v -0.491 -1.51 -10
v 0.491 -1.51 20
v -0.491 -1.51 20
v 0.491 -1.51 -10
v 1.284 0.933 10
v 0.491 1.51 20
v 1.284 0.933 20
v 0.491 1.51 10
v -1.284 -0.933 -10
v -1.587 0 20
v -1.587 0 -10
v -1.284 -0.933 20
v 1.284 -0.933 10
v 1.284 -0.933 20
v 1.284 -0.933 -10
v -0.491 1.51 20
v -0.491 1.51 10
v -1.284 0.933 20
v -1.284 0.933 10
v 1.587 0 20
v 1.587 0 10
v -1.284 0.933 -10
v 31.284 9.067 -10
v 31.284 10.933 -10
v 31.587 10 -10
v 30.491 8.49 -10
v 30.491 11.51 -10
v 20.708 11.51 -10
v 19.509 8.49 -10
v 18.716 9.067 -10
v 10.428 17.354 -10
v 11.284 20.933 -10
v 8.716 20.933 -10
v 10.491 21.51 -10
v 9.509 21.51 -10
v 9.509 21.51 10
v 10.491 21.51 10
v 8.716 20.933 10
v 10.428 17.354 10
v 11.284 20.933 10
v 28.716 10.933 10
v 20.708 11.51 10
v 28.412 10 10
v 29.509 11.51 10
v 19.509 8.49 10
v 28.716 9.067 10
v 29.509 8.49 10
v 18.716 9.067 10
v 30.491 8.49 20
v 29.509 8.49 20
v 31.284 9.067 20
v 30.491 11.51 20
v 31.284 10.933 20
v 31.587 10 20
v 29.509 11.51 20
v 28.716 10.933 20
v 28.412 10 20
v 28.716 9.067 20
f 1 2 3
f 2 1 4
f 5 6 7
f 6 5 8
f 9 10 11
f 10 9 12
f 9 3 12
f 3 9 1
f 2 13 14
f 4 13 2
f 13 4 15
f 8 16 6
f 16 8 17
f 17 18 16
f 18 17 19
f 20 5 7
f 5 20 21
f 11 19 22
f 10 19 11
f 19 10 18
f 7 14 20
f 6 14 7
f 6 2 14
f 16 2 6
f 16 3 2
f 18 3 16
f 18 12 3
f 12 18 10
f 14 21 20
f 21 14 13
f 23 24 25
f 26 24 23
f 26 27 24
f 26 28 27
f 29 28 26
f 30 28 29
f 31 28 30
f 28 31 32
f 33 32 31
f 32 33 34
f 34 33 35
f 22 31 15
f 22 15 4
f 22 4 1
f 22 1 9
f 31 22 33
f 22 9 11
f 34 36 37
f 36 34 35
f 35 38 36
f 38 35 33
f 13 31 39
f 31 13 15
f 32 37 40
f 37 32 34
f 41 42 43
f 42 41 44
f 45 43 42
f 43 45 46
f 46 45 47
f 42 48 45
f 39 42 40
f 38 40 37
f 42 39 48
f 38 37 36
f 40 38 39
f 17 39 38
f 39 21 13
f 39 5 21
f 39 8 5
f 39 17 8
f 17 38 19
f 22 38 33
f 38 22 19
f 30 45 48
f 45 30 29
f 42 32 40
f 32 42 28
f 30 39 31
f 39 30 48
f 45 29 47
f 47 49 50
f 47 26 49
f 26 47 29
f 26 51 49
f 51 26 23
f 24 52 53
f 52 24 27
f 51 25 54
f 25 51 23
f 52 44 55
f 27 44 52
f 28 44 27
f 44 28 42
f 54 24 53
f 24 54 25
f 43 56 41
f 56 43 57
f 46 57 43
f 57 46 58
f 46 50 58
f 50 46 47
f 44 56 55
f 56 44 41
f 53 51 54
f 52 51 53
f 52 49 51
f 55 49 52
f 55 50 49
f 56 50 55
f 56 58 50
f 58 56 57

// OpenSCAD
module tool() {
    //simulate 1/8'' flat end mill
    cylinder(20,1.5875,1.5875, $fn=10);
}

/*
module tool() {
    //show toolpaths as thin lines or simulate 3d printer
    sphere(0.1, $fn=10);
}
*/

module path(a, b) {
    hull() {
        translate(a) tool();
        translate(b) tool();
    }
}

module gcode(vec) {
    for(i = [0:len(vec)]) path(vec[i-2],vec[i-1]);
}

//vector generated from g-code
vec = [
[0,0,0],
[0,0,-10],
[10,20,-10],
[20,10,-10],
[30,10,-10],
[30,10,0],
];

difference() {
    //stock material
    %translate([-10,-10,-20]) cube([50,40,20]);
    //object generated from g-code
    gcode(vec);
}
